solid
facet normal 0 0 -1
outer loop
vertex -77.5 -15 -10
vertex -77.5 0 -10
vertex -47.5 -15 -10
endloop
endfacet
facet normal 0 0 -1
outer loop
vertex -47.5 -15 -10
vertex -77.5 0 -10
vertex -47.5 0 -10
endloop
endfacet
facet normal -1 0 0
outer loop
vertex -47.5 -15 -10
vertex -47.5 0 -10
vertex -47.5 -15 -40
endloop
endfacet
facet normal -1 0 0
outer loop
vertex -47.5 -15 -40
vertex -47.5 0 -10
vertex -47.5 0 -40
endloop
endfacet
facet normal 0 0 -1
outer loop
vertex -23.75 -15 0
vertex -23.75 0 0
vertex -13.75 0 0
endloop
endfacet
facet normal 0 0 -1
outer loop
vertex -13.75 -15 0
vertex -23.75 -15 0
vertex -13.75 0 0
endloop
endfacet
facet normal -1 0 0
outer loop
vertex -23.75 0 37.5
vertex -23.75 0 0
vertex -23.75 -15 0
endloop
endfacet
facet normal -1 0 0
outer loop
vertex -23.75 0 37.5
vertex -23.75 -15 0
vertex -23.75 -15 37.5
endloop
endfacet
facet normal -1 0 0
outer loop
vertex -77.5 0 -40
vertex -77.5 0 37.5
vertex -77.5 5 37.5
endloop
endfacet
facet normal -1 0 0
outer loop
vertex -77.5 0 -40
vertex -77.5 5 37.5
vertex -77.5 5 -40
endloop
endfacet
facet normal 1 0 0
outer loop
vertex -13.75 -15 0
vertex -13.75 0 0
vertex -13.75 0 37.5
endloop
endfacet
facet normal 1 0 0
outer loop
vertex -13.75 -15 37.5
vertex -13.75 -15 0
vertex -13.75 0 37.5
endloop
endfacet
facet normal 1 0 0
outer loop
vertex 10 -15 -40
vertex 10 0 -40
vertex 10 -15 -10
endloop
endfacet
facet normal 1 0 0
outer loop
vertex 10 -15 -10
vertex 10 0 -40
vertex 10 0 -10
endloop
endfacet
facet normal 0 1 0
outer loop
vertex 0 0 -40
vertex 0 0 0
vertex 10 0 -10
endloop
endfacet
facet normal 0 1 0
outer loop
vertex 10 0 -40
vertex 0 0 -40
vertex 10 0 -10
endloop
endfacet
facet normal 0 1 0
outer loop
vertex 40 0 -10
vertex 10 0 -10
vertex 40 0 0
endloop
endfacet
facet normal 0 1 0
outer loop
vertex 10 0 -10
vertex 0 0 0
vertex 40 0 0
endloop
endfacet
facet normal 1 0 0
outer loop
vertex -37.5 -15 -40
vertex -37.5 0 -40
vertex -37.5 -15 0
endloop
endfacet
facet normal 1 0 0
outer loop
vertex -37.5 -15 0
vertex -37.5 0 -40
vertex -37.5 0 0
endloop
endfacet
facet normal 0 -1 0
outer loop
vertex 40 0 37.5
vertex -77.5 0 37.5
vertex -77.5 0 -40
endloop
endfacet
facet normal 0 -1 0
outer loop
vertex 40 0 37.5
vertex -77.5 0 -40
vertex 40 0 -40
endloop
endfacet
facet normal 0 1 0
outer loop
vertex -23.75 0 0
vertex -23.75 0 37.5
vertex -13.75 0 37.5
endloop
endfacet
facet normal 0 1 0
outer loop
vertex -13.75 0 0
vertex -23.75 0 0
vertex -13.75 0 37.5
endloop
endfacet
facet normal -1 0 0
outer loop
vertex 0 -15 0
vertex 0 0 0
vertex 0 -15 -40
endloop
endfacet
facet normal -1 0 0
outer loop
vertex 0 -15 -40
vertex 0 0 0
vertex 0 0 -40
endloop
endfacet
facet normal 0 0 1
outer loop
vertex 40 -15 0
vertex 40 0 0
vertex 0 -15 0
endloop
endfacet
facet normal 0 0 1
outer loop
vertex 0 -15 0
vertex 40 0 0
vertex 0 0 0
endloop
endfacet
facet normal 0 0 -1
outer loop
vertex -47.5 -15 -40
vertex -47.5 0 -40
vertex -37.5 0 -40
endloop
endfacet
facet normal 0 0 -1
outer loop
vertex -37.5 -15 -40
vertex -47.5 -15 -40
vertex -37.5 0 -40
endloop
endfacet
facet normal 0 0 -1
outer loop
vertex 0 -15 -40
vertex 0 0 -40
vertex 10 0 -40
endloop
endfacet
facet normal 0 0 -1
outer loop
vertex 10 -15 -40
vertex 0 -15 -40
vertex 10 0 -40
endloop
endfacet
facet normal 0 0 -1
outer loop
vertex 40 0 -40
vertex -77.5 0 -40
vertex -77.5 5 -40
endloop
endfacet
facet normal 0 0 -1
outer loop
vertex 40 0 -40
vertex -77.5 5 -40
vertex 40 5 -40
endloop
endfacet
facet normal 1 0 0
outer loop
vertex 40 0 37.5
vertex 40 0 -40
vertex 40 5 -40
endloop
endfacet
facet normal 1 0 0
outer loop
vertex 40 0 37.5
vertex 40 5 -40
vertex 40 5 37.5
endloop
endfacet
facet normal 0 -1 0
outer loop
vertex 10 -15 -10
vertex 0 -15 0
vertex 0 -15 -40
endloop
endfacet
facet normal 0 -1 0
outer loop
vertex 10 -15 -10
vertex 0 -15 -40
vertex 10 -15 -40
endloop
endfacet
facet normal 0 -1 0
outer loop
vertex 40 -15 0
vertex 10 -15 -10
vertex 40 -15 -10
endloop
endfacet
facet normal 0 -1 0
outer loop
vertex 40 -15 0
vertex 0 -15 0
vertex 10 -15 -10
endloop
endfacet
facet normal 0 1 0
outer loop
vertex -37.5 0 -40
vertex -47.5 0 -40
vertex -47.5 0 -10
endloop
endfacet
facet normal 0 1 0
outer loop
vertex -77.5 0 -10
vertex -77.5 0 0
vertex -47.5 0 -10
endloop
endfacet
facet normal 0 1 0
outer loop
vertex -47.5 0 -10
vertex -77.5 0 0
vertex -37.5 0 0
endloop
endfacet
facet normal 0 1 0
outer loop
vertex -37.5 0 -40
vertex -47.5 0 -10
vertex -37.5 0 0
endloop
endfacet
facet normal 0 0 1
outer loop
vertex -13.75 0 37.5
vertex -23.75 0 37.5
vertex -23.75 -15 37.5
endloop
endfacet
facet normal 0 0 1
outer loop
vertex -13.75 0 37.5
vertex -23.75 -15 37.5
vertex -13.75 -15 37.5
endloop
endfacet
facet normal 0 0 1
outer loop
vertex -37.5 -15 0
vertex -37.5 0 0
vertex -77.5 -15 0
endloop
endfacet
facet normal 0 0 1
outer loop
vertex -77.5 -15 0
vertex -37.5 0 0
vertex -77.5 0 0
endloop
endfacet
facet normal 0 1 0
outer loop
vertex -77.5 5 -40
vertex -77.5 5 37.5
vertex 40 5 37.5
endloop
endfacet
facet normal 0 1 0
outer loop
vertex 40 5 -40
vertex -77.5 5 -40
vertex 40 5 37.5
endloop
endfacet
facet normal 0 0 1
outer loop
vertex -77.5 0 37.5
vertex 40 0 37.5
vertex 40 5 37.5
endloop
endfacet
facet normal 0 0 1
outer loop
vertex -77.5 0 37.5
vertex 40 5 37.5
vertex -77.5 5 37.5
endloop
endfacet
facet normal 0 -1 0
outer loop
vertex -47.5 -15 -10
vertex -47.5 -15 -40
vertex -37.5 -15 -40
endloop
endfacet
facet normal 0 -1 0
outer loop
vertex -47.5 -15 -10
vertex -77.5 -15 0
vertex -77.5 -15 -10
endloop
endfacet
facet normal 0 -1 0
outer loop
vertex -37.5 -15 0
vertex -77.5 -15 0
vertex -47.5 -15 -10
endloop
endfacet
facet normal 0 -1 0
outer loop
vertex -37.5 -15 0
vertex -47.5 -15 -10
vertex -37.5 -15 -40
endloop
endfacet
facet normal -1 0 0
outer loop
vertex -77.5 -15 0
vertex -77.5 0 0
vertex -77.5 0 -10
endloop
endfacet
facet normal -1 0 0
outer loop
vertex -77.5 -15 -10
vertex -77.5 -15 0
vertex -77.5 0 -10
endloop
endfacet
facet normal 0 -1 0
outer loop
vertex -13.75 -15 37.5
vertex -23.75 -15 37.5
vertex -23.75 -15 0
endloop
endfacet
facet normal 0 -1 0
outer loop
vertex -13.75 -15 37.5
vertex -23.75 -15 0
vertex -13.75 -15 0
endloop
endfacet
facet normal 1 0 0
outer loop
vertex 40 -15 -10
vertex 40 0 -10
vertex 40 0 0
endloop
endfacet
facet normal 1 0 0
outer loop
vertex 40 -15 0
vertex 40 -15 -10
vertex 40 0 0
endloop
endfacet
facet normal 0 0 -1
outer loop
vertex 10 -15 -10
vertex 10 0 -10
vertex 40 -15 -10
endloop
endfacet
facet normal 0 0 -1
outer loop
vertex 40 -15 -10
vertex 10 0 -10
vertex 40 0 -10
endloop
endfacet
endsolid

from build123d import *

# Parameters (mm, degrees)
F0_W     = 10
F0_H     = 37.5
F1_DEPTH = 15
F0_W_2   = 30
F0_H_2   = 30
F2_DEPTH = 5


with BuildPart() as f1:
    # F0 (on Front) → F1 (new body)
    with BuildSketch(Plane.XZ):
        with Locations((-18.75, 18.75)):
            Rectangle(F0_W, F0_H)
        Polygon((40, 0), (0, 0), (0, -40), (10, -40), (10, -10), (40, -10), align=None)
        Polygon((-47.5, -40), (-37.5, -40), (-37.5, 0), (-77.5, 0), (-77.5, -10), (-47.5, -10), align=None)
    extrude(amount=F1_DEPTH)


with BuildPart() as f2:
    # F0 (on Front) → F2 (new body)
    with BuildSketch(Plane.XZ):
        Polygon((0, -40), (0, 0), (40, 0), (40, 37.5), (-13.75, 37.5), (-13.75, 0), (-23.75, 0), (-23.75, 37.5), (-77.5, 37.5), (-77.5, 0), (-37.5, 0), (-37.5, -40), align=None)
        Polygon((40, 0), (0, 0), (0, -40), (10, -40), (10, -10), (40, -10), align=None)
        with Locations((25, -25)):
            Rectangle(F0_W_2, F0_H_2)
        Polygon((-47.5, -40), (-37.5, -40), (-37.5, 0), (-77.5, 0), (-77.5, -10), (-47.5, -10), align=None)
        with Locations((-18.75, 18.75)):
            Rectangle(F0_W, F0_H)
        with Locations((-62.5, -25)):
            Rectangle(F0_W_2, F0_H_2)
    extrude(amount=-F2_DEPTH)


solid = Compound([f1.part, f2.part])
